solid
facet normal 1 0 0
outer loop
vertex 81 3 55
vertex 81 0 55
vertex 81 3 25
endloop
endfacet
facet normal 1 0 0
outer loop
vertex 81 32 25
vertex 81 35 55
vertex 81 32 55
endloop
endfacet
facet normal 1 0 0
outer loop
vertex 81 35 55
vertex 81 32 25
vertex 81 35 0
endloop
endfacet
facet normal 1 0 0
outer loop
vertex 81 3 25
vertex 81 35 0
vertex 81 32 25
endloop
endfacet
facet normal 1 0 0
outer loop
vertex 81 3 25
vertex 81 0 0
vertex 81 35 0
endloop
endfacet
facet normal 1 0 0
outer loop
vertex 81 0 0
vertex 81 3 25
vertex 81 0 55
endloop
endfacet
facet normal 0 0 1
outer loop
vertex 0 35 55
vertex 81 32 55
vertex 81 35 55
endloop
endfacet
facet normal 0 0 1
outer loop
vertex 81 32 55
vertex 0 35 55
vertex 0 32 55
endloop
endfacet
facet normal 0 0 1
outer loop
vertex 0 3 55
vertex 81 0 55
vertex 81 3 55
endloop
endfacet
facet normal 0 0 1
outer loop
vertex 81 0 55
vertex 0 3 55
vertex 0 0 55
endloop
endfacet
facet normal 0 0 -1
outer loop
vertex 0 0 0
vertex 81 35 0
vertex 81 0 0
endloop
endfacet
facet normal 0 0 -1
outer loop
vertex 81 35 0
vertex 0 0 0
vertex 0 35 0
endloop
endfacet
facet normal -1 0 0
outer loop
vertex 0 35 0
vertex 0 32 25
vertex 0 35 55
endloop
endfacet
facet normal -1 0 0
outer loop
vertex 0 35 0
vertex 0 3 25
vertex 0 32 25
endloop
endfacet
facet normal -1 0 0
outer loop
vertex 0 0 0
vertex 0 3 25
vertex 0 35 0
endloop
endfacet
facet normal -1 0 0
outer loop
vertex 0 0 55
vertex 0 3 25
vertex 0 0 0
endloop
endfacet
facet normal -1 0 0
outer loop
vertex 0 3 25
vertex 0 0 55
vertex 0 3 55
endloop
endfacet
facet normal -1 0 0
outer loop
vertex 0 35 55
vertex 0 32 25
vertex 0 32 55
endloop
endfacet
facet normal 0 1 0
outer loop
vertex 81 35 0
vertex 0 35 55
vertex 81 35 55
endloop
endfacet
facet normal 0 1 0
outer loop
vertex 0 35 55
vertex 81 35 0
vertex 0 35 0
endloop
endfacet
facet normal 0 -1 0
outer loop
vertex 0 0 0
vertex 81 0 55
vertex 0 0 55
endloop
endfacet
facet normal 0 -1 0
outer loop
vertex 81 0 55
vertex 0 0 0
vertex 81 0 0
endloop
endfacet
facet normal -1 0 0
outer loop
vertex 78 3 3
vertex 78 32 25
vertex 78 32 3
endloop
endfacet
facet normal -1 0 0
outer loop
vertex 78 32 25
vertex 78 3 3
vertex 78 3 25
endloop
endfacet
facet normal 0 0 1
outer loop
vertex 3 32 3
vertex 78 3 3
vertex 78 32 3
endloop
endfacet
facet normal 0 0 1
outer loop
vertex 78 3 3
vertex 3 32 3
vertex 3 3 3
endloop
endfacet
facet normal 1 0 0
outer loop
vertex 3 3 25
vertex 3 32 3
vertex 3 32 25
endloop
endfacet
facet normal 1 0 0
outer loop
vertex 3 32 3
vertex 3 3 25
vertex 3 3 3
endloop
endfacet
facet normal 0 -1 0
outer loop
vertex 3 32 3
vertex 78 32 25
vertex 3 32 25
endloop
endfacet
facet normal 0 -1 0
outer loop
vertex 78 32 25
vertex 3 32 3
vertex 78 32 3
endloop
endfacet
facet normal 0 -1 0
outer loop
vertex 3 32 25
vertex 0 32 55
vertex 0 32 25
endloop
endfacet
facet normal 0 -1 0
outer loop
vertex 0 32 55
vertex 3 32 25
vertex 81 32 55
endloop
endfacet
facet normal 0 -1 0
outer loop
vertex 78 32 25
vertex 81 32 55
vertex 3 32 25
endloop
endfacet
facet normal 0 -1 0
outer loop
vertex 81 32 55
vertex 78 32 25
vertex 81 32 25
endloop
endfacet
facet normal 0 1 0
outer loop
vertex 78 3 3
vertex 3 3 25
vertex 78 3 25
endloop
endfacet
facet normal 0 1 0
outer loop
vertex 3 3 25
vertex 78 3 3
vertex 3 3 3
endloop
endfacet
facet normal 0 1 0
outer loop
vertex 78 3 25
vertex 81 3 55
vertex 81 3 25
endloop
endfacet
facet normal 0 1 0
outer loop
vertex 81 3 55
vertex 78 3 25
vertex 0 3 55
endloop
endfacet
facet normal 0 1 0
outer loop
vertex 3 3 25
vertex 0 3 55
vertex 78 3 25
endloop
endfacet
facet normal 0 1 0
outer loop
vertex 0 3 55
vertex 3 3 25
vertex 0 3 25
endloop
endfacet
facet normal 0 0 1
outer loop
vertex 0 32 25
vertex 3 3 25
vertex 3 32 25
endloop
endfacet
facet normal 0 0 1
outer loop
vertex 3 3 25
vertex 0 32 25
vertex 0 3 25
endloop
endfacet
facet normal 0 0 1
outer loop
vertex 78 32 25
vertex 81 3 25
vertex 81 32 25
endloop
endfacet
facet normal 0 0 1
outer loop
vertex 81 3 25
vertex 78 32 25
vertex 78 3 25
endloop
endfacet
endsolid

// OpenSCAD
difference()
{
	cube ([81,35,55]);
	translate ([3,3,3]) cube ([75,29,100]);
	translate ([-3,3,25]) cube ([95,29,100]);
}
